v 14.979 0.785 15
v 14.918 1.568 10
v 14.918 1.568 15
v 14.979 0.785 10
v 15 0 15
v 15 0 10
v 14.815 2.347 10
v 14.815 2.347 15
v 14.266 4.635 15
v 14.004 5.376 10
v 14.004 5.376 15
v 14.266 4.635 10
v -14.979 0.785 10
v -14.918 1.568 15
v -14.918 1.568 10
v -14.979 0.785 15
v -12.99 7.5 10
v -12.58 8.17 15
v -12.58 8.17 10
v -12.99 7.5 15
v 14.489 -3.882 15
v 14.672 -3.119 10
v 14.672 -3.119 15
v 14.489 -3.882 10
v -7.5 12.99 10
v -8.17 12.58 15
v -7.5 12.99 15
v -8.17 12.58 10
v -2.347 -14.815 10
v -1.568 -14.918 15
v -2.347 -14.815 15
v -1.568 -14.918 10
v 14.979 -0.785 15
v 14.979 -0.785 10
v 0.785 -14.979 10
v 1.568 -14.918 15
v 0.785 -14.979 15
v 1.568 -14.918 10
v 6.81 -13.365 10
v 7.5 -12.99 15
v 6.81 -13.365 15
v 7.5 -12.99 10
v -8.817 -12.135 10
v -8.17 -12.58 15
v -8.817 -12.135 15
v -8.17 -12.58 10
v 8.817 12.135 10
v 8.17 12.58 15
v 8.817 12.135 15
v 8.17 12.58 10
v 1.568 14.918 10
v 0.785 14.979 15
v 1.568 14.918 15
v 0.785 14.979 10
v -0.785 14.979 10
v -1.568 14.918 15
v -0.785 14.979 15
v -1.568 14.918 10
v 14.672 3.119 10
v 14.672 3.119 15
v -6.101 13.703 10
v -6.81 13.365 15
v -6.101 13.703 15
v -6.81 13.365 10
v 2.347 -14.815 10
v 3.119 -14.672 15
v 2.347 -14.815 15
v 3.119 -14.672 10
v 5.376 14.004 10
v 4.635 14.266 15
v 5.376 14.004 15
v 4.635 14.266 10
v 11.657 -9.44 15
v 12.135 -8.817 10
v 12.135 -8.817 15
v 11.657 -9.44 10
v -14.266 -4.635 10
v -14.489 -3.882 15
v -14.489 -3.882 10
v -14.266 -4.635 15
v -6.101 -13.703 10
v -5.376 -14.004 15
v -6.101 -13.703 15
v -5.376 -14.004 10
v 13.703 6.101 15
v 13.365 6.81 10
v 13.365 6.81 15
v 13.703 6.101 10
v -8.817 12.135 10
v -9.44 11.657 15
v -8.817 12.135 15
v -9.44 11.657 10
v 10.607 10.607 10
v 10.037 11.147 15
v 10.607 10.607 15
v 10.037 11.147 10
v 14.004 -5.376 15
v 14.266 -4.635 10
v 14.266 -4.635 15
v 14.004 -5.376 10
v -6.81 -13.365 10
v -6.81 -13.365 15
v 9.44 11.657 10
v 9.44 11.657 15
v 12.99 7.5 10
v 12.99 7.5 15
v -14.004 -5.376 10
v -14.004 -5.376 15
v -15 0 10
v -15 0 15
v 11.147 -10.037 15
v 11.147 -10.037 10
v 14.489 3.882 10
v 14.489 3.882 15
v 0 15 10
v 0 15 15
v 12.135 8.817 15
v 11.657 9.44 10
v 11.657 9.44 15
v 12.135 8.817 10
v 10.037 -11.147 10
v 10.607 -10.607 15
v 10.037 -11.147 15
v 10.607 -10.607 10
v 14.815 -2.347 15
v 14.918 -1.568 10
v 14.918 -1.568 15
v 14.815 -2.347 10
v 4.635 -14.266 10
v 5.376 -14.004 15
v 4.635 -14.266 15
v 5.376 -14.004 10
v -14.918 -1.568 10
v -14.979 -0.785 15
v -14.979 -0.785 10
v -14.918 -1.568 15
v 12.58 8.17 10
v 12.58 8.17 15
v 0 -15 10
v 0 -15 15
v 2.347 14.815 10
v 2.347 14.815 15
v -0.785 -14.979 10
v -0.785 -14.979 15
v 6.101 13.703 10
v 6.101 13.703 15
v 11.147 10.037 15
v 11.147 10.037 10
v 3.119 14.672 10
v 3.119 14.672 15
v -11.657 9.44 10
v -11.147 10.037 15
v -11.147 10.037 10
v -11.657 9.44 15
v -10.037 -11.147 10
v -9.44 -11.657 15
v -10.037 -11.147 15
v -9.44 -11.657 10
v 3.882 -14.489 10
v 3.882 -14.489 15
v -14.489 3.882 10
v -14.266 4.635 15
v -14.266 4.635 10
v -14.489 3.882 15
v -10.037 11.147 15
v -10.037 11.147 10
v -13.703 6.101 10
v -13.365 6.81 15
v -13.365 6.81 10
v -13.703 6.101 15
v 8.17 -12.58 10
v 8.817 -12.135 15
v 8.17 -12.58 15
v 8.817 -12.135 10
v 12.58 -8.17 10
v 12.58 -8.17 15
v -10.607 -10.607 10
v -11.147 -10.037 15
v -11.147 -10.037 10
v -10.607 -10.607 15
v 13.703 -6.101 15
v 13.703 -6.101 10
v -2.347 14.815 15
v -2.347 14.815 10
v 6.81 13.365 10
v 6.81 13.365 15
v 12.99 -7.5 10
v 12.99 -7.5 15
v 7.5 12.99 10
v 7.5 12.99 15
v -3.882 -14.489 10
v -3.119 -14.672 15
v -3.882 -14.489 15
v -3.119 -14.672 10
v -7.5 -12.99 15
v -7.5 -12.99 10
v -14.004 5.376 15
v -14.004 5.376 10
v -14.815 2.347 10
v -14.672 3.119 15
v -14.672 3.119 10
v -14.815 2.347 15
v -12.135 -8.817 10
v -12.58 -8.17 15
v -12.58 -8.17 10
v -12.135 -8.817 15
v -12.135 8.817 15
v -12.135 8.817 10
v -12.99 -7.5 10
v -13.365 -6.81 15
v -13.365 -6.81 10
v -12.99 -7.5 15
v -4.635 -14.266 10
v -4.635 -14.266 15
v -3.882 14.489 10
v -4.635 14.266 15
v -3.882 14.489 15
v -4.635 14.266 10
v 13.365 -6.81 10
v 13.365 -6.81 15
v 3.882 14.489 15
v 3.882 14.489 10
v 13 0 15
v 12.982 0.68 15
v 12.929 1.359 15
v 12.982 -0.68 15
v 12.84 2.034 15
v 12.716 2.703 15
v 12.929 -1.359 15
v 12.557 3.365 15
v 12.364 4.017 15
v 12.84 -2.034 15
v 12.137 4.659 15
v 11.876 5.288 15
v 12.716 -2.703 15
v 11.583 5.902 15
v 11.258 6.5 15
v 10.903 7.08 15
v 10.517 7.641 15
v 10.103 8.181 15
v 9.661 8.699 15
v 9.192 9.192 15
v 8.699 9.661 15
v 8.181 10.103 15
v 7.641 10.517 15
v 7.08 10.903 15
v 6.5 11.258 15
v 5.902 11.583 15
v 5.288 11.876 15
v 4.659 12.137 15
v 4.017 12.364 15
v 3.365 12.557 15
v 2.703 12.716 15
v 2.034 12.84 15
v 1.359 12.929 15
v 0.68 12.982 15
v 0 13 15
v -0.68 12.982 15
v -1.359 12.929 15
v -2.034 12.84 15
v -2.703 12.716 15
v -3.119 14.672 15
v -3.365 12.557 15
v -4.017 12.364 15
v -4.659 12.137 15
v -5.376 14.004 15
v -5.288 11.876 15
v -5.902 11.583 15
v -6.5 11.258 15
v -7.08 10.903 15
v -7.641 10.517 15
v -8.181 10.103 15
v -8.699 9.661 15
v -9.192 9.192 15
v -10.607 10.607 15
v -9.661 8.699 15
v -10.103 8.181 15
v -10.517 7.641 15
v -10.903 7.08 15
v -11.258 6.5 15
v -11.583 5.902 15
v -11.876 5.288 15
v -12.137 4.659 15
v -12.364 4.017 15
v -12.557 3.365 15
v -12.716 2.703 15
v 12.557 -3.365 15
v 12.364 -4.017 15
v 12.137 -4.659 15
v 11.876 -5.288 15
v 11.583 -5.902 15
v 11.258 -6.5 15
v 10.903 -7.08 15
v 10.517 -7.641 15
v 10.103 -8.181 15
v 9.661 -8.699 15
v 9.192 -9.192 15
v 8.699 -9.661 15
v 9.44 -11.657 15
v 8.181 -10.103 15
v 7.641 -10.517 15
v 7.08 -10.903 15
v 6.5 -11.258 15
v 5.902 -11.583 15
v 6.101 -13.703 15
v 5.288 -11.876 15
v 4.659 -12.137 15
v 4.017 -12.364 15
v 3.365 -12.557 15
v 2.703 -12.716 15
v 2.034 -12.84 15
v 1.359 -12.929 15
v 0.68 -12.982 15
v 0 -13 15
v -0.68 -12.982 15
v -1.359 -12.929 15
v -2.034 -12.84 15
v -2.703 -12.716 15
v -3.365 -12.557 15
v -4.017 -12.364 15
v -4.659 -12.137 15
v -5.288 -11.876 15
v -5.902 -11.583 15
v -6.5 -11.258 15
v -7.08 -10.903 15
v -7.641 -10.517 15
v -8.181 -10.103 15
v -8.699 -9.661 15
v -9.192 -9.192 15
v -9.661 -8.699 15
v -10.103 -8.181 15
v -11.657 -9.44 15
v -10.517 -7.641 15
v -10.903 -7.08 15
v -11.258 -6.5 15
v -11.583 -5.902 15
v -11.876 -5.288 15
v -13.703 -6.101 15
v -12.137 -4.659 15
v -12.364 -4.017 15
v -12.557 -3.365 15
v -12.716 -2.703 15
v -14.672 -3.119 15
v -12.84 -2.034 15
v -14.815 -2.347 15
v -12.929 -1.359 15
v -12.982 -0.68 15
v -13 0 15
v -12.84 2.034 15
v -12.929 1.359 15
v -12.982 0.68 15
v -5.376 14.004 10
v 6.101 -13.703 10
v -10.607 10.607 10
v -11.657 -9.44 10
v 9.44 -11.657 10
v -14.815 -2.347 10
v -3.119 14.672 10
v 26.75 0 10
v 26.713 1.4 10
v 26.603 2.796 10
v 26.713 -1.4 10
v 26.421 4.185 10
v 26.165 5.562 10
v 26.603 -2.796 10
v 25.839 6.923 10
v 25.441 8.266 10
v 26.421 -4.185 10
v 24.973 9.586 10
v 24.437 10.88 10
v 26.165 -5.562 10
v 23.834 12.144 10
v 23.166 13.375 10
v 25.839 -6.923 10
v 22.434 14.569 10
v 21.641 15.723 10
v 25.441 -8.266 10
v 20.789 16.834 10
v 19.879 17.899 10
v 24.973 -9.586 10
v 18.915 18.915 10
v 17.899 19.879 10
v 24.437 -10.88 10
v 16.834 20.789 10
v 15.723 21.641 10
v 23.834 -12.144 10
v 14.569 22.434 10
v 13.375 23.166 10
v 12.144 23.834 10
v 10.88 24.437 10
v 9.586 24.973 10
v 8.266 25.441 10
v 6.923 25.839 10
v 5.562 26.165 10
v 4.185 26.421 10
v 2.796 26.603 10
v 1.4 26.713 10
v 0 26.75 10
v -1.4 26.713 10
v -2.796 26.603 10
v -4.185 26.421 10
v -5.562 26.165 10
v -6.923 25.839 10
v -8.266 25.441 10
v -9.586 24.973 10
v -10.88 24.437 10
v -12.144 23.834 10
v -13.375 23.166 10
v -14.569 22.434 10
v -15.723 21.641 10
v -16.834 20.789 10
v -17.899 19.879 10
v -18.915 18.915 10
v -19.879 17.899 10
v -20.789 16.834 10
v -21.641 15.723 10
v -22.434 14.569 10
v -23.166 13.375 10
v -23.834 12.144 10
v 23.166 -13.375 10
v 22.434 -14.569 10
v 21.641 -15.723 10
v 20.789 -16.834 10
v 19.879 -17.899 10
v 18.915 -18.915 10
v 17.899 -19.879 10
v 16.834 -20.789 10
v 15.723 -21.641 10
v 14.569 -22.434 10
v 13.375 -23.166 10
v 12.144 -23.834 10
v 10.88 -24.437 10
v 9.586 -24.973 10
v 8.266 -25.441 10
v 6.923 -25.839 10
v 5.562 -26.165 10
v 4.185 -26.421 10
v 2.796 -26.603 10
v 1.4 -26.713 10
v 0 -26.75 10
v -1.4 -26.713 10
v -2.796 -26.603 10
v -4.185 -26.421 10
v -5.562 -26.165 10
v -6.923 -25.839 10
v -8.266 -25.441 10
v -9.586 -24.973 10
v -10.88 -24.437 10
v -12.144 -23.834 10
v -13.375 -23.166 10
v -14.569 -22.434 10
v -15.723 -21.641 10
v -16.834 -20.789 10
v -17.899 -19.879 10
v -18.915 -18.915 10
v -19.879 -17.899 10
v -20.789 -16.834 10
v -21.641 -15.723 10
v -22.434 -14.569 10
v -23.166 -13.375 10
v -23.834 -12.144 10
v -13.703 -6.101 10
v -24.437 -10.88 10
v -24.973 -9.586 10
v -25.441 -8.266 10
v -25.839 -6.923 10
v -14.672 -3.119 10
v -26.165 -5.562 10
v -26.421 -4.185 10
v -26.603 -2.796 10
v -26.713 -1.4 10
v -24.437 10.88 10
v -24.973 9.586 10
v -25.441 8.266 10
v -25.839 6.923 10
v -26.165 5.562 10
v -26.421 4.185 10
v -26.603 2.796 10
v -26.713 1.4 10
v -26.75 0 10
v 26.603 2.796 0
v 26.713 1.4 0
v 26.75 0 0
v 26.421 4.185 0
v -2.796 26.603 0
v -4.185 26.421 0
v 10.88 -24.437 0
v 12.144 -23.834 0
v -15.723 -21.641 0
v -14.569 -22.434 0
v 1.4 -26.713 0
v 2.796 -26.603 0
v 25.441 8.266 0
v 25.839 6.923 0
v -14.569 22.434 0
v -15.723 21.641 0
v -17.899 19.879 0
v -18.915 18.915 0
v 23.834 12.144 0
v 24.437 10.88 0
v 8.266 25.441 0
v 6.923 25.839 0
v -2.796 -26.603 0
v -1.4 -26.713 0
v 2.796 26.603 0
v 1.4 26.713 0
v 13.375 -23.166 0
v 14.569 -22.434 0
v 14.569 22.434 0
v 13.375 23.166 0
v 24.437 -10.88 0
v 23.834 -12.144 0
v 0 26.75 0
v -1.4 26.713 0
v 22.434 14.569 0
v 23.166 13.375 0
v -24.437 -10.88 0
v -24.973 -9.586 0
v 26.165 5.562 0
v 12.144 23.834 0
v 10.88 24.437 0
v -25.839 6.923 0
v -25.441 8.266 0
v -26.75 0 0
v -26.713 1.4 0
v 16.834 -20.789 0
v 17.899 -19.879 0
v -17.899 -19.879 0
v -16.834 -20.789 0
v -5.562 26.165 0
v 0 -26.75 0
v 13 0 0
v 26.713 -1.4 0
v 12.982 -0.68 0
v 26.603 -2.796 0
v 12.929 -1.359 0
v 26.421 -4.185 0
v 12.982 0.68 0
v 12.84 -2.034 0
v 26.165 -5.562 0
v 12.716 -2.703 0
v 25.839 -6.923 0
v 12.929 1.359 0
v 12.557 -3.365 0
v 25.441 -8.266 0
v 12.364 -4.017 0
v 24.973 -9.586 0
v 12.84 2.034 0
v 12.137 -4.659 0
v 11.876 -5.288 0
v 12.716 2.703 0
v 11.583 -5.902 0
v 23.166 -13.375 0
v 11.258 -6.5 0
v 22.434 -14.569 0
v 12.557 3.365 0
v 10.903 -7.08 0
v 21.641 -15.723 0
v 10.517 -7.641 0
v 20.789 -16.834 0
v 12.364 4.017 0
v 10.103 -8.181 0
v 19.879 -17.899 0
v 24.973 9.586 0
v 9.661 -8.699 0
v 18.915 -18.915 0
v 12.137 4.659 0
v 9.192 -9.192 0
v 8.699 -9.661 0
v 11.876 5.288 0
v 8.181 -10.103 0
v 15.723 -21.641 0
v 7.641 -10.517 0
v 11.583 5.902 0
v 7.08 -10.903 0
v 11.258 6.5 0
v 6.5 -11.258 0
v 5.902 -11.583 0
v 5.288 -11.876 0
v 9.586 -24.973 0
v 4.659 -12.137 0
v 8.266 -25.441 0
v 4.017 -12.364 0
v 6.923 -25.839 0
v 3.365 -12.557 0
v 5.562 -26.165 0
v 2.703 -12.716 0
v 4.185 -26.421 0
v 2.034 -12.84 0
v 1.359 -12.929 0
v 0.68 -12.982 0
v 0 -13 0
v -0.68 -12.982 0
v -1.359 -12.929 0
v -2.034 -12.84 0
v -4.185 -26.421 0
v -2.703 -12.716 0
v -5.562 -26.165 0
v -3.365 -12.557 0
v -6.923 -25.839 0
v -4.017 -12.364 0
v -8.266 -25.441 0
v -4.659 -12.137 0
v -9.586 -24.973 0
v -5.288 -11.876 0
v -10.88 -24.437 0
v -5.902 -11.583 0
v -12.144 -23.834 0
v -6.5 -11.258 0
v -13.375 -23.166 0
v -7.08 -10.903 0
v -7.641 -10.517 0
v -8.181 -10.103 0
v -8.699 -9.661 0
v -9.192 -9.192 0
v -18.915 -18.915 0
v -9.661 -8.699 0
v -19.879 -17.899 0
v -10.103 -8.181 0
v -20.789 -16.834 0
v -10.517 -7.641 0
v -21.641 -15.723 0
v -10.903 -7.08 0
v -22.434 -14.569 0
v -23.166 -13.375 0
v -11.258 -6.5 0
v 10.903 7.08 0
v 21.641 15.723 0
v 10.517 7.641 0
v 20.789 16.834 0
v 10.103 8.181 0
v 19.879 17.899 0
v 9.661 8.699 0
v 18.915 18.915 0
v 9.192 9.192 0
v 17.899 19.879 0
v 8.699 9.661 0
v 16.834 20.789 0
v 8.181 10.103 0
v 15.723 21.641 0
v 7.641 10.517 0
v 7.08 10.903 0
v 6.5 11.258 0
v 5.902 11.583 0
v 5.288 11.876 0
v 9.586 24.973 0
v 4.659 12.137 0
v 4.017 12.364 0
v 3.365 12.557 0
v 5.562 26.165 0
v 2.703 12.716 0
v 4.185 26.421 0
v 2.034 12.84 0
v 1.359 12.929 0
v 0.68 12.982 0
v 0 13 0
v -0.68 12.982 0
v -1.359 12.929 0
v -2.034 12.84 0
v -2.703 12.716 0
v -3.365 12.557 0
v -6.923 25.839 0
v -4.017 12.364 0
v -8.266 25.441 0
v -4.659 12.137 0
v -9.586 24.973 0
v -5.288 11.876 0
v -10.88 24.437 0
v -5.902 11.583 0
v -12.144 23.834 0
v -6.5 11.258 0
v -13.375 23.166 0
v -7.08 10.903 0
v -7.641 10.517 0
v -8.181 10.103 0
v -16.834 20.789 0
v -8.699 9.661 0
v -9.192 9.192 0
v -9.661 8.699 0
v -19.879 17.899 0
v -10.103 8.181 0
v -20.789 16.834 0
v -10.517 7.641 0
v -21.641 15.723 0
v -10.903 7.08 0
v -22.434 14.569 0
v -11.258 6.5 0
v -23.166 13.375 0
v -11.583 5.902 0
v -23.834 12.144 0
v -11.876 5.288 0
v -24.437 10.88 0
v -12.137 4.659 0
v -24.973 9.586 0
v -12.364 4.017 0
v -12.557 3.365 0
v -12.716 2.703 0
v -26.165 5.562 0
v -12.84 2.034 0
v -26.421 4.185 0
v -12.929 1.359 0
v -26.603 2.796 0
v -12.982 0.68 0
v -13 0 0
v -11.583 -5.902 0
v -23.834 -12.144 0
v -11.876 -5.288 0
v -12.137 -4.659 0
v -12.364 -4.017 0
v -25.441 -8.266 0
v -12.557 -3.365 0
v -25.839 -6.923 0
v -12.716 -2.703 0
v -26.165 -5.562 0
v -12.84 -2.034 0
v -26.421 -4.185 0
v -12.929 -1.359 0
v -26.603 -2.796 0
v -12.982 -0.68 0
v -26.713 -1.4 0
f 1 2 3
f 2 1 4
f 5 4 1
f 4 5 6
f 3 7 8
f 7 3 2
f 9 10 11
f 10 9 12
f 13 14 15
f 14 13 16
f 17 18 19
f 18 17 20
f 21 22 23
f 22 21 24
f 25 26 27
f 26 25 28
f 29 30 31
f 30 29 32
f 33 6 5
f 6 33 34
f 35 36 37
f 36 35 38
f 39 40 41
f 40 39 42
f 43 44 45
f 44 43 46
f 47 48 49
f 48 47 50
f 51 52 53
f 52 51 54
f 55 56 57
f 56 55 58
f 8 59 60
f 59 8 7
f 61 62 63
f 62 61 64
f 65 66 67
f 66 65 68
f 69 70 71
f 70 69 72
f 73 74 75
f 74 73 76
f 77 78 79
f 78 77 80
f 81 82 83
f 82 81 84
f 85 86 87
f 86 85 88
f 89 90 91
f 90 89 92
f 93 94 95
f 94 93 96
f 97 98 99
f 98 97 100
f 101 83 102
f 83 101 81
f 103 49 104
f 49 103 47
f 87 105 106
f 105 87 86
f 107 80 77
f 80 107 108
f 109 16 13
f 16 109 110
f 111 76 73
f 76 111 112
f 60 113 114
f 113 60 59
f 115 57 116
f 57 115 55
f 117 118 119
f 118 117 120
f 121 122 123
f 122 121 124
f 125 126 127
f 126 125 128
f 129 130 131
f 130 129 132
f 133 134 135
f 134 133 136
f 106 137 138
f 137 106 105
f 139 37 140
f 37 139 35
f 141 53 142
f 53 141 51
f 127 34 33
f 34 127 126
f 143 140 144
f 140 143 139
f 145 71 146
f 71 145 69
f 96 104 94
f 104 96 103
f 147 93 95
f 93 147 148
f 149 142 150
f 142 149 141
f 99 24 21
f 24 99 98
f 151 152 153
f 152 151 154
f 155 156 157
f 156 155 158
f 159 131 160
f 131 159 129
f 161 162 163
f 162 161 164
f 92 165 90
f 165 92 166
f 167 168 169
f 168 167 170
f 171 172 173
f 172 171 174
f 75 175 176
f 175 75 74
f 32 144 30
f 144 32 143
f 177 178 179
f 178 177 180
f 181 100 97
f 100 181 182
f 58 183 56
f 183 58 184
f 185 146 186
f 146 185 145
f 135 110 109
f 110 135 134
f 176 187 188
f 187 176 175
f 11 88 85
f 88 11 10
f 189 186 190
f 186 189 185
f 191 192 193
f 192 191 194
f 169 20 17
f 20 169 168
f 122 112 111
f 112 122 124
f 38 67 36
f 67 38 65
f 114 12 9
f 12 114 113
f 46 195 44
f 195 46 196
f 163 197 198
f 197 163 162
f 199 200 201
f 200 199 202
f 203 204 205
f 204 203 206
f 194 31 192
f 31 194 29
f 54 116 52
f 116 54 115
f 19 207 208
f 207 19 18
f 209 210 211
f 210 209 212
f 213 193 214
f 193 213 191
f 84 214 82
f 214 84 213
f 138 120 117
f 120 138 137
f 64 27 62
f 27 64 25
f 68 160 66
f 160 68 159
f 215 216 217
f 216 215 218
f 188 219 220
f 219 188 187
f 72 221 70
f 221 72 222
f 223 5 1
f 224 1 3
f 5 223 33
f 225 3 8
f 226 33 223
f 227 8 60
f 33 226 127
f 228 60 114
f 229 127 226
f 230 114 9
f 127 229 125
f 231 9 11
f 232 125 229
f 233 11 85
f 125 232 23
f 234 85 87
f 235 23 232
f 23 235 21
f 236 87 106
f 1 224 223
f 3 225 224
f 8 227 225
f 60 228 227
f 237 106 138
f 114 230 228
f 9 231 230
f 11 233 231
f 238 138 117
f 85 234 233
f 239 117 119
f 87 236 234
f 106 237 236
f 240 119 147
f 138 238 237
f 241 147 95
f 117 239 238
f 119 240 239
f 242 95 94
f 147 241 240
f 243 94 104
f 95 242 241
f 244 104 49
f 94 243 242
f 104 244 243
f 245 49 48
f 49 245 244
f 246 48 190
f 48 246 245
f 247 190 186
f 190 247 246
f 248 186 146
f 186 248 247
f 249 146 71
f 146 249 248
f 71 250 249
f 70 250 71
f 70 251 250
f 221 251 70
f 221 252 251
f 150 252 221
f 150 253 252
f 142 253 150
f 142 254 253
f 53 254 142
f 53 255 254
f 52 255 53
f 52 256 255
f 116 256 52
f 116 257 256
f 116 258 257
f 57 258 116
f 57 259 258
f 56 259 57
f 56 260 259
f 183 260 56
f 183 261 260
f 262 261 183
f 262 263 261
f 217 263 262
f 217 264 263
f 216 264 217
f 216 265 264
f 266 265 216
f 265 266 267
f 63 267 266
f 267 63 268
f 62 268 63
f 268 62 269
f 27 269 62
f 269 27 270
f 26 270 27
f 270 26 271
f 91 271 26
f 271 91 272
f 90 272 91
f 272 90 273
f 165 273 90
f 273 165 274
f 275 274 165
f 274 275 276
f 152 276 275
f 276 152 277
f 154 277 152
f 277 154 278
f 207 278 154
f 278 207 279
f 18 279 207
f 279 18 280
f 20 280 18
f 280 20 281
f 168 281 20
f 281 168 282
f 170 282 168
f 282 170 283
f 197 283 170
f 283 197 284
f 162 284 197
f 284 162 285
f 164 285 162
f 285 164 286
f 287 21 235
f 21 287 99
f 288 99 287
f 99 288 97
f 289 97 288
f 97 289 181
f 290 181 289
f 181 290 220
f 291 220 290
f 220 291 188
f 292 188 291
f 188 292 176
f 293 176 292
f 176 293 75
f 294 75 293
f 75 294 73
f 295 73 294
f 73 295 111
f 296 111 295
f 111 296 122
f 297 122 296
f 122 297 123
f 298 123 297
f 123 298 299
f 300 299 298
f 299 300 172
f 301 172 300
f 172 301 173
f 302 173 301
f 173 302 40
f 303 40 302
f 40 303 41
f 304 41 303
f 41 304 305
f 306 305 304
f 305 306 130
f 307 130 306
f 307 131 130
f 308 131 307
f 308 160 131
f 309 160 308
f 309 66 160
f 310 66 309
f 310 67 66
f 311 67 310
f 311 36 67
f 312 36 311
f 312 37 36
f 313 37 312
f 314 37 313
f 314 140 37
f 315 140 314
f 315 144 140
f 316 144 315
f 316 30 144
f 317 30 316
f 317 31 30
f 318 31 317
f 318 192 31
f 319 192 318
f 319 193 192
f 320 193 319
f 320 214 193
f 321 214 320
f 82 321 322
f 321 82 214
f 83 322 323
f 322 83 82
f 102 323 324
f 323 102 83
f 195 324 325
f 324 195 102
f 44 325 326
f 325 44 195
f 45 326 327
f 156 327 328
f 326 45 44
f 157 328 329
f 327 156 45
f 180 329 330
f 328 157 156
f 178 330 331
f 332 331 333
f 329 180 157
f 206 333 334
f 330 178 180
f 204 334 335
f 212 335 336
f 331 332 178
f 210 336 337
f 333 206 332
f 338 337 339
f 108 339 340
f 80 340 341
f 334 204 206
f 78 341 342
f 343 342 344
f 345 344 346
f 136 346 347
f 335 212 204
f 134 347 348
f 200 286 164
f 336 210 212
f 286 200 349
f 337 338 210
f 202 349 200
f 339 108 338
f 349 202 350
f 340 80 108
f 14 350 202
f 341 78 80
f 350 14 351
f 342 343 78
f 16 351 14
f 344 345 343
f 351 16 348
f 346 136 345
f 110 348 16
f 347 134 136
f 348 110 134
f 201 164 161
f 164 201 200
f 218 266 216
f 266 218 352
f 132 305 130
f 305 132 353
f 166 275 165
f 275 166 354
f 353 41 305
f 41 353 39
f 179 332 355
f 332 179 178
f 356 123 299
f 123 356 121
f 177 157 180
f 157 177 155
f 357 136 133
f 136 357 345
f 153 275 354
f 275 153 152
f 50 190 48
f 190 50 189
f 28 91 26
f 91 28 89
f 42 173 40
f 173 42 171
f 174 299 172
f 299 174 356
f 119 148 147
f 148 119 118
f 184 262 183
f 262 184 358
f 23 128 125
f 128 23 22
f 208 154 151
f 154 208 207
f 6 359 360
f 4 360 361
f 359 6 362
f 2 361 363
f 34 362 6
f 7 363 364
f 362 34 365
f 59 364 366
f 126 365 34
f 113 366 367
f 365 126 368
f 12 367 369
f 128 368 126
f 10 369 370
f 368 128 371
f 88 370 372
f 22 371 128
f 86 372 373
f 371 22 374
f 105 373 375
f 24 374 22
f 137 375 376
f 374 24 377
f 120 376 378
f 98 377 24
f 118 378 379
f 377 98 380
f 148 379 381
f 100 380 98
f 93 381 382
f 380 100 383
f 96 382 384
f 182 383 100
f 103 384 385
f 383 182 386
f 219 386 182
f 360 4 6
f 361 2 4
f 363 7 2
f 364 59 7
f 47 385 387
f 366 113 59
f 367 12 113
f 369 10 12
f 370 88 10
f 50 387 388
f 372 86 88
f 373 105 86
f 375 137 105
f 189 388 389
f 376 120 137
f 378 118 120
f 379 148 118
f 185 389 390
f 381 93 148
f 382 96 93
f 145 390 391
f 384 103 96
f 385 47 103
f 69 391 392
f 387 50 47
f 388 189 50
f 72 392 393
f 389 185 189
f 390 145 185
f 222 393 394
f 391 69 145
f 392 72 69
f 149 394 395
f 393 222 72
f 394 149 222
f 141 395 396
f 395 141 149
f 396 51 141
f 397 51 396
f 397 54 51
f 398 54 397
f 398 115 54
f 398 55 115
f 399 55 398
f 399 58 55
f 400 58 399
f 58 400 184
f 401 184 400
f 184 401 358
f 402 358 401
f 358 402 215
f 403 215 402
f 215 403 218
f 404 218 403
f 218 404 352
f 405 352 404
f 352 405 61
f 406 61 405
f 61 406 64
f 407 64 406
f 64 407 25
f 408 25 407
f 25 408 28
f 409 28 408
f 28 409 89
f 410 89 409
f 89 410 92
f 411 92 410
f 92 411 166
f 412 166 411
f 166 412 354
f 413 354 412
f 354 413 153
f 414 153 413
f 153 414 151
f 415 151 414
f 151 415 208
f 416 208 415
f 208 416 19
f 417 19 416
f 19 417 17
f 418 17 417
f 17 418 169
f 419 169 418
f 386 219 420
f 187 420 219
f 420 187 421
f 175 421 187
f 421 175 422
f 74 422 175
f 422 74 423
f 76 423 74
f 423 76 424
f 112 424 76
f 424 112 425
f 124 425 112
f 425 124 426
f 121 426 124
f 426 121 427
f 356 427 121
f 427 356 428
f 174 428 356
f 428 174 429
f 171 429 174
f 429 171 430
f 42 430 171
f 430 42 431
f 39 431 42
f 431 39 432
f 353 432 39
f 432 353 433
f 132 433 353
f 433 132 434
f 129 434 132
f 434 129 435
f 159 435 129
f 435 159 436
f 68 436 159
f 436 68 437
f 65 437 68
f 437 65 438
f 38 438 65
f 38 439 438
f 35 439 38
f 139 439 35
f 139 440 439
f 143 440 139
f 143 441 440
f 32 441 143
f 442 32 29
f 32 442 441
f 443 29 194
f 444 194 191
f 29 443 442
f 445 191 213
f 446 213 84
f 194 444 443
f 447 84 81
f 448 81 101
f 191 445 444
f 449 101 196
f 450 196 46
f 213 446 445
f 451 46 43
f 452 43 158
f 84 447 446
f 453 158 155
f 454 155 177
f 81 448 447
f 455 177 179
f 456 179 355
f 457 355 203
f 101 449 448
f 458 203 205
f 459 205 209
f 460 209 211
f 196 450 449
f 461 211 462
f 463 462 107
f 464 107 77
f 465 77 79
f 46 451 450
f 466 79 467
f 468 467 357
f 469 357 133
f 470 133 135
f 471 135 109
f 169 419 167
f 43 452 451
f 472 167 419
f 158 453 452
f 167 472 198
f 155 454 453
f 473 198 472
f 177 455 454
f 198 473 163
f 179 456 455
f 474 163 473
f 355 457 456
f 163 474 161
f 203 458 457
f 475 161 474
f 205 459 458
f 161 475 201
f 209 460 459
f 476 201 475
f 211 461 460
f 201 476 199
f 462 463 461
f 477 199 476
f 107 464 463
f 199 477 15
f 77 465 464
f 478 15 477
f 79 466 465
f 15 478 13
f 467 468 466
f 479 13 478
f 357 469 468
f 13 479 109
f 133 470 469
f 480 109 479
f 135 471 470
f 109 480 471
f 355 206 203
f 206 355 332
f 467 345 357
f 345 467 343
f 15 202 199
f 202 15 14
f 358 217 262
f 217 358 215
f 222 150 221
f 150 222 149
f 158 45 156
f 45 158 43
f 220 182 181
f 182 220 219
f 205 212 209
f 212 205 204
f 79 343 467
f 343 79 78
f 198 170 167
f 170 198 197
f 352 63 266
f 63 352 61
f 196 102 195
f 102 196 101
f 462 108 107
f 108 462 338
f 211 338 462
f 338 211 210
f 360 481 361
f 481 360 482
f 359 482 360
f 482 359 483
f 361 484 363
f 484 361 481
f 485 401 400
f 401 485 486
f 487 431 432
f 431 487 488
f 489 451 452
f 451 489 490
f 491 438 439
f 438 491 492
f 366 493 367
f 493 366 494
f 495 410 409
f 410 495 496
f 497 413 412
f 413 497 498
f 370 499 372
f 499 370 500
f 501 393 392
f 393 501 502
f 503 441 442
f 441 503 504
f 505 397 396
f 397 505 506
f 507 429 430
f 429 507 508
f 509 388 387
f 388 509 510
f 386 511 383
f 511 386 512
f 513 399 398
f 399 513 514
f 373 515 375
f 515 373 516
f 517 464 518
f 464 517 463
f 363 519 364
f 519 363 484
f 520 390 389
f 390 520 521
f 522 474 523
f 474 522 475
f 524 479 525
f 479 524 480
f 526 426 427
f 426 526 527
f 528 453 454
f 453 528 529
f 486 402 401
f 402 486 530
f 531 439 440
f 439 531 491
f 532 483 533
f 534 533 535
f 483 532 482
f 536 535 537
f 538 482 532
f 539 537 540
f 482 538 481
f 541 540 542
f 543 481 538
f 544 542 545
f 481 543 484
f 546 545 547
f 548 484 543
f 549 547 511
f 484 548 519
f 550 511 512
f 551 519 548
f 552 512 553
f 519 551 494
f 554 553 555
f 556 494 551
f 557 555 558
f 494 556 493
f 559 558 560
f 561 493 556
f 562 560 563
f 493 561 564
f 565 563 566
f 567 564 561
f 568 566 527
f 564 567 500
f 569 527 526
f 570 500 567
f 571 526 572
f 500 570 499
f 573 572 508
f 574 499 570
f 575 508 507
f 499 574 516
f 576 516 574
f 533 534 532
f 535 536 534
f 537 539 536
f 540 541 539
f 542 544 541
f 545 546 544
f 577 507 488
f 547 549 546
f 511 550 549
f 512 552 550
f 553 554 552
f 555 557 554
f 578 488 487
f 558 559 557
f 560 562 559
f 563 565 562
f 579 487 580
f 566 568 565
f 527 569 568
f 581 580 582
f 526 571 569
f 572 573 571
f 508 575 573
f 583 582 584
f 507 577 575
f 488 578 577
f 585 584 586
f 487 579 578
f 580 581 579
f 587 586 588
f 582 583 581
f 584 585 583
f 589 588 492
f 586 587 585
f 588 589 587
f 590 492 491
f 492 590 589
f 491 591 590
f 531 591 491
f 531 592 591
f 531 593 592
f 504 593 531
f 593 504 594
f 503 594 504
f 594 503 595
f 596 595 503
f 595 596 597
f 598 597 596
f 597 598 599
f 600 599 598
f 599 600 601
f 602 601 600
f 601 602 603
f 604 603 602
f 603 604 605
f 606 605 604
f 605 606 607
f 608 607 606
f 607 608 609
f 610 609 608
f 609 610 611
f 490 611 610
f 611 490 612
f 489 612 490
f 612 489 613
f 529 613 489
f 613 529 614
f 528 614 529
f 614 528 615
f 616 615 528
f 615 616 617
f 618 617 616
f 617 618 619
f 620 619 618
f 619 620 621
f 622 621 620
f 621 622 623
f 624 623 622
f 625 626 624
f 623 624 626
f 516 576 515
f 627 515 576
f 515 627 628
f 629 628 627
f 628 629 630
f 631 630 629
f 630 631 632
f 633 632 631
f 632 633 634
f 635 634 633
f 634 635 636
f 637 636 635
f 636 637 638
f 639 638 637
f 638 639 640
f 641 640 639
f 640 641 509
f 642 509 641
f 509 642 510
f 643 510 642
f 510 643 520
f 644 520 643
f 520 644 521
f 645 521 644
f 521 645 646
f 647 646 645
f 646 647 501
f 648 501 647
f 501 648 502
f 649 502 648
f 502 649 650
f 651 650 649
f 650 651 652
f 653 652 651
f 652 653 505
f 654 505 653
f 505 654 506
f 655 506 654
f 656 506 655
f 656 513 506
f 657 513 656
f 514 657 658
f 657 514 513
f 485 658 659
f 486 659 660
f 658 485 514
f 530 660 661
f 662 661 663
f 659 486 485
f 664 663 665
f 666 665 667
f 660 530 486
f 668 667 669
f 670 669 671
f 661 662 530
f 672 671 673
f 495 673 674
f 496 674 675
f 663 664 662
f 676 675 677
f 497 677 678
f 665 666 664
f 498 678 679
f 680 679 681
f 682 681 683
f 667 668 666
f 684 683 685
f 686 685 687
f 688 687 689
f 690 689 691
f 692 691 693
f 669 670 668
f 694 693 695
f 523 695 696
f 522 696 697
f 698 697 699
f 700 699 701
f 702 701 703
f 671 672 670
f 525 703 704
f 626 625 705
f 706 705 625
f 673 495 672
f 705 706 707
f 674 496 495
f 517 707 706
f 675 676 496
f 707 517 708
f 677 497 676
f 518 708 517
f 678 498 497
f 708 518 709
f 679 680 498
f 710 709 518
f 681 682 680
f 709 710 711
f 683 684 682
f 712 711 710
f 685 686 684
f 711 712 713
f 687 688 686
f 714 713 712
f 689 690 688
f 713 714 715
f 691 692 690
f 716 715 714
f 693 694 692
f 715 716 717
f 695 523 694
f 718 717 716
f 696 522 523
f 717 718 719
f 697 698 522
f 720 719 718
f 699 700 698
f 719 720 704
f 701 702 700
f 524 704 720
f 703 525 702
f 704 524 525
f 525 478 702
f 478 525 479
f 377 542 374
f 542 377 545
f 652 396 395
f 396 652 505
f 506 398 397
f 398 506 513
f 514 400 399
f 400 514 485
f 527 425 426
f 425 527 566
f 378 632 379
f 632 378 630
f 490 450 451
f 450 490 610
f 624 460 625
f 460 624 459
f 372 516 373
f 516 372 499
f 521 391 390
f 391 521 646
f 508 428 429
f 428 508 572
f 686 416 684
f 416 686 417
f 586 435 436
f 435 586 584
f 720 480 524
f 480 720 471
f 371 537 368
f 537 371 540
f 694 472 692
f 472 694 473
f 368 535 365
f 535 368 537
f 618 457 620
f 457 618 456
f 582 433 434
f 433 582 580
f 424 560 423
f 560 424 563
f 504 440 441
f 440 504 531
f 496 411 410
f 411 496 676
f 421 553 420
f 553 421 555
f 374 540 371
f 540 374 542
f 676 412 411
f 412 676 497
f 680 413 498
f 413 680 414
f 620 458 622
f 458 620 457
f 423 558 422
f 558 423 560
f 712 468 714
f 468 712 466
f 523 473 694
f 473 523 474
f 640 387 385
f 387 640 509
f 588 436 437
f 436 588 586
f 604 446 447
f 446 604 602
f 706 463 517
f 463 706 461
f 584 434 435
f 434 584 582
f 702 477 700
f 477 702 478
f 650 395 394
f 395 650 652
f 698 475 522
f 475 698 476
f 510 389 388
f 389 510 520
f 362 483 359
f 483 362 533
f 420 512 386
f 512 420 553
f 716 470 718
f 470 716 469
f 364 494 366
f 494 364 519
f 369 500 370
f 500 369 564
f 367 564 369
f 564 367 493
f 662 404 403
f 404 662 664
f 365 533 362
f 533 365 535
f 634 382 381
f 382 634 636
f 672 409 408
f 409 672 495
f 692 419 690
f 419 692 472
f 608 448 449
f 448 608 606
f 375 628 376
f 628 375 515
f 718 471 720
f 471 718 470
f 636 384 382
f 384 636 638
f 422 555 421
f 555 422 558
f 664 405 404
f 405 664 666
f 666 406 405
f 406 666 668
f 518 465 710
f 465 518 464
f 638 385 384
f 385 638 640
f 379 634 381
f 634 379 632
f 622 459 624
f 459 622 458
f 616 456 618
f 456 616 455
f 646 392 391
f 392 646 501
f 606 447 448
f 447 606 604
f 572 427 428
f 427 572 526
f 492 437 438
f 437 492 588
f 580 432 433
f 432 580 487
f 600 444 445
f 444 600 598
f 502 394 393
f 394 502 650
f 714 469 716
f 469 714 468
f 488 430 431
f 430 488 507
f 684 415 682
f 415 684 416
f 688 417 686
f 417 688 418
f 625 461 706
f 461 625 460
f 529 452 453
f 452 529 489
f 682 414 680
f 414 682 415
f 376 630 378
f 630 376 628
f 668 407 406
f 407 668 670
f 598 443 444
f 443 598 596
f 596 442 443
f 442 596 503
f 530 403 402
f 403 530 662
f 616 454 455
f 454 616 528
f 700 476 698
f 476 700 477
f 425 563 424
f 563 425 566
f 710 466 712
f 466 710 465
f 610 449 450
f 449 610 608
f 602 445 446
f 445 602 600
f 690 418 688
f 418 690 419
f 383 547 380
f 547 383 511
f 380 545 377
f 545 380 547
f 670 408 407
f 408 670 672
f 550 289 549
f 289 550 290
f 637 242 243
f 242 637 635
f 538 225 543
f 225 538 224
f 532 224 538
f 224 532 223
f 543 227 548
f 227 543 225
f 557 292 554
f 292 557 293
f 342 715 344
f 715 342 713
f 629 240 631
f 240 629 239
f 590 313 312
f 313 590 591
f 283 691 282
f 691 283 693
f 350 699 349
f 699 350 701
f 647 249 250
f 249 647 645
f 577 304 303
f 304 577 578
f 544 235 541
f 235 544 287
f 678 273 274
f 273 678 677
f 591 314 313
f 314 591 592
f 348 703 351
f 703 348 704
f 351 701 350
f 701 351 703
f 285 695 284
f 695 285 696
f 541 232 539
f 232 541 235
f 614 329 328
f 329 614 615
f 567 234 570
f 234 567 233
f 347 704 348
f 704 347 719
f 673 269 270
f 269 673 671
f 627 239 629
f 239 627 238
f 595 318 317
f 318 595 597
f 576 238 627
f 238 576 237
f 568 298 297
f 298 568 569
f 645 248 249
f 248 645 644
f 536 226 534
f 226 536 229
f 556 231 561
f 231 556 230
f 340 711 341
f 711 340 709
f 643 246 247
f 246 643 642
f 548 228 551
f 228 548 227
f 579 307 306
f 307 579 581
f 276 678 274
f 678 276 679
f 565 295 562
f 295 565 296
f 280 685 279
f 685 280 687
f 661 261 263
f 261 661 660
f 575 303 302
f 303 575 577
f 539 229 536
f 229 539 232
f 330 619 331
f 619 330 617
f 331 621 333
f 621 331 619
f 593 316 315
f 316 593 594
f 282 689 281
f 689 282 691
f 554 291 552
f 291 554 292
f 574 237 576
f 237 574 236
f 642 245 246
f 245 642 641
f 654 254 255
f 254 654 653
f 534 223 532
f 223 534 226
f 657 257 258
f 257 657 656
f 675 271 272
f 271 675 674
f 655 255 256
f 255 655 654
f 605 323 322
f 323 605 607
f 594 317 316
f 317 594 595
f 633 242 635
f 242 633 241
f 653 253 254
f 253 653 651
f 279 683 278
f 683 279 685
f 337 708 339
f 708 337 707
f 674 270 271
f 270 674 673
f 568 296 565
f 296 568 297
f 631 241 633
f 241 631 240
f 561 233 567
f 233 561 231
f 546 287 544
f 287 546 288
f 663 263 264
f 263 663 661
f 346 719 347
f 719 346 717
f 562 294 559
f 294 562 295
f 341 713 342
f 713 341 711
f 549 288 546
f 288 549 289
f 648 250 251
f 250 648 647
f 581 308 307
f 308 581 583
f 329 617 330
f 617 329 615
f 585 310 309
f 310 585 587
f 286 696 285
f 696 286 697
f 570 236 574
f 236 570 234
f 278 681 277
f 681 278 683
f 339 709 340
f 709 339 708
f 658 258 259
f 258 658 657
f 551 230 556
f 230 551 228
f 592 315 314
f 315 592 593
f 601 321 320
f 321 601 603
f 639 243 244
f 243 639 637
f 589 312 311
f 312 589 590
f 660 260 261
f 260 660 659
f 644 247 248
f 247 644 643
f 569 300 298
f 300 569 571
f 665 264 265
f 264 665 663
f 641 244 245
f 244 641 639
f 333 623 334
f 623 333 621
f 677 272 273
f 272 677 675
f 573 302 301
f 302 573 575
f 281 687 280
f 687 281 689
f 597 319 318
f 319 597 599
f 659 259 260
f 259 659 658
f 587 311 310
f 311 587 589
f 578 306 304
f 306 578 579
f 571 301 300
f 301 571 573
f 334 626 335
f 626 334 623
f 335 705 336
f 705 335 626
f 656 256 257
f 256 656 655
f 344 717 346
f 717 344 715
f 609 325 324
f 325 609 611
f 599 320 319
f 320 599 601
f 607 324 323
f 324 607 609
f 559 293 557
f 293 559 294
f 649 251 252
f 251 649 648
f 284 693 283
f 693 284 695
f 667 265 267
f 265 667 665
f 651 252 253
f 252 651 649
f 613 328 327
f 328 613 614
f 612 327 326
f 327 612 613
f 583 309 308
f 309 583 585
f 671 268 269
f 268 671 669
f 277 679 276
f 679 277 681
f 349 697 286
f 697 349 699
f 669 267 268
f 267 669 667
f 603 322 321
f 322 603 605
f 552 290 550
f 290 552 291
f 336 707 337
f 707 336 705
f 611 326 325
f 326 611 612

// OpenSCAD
$fn=120;
spool_hole=53.5;
hole_diameter=30;
spool_height=10;

spool_adaptor();

module spool_adaptor(spool_hole=spool_hole){
    difference(){
        union(){
            translate([0,0,spool_height]) cylinder(d=hole_diameter,h=5);
            cylinder(d=spool_hole, h=spool_height);
        }
        translate([0,0,-0.5]) cylinder(d=hole_diameter-4, h=spool_height+6);
    }
}
